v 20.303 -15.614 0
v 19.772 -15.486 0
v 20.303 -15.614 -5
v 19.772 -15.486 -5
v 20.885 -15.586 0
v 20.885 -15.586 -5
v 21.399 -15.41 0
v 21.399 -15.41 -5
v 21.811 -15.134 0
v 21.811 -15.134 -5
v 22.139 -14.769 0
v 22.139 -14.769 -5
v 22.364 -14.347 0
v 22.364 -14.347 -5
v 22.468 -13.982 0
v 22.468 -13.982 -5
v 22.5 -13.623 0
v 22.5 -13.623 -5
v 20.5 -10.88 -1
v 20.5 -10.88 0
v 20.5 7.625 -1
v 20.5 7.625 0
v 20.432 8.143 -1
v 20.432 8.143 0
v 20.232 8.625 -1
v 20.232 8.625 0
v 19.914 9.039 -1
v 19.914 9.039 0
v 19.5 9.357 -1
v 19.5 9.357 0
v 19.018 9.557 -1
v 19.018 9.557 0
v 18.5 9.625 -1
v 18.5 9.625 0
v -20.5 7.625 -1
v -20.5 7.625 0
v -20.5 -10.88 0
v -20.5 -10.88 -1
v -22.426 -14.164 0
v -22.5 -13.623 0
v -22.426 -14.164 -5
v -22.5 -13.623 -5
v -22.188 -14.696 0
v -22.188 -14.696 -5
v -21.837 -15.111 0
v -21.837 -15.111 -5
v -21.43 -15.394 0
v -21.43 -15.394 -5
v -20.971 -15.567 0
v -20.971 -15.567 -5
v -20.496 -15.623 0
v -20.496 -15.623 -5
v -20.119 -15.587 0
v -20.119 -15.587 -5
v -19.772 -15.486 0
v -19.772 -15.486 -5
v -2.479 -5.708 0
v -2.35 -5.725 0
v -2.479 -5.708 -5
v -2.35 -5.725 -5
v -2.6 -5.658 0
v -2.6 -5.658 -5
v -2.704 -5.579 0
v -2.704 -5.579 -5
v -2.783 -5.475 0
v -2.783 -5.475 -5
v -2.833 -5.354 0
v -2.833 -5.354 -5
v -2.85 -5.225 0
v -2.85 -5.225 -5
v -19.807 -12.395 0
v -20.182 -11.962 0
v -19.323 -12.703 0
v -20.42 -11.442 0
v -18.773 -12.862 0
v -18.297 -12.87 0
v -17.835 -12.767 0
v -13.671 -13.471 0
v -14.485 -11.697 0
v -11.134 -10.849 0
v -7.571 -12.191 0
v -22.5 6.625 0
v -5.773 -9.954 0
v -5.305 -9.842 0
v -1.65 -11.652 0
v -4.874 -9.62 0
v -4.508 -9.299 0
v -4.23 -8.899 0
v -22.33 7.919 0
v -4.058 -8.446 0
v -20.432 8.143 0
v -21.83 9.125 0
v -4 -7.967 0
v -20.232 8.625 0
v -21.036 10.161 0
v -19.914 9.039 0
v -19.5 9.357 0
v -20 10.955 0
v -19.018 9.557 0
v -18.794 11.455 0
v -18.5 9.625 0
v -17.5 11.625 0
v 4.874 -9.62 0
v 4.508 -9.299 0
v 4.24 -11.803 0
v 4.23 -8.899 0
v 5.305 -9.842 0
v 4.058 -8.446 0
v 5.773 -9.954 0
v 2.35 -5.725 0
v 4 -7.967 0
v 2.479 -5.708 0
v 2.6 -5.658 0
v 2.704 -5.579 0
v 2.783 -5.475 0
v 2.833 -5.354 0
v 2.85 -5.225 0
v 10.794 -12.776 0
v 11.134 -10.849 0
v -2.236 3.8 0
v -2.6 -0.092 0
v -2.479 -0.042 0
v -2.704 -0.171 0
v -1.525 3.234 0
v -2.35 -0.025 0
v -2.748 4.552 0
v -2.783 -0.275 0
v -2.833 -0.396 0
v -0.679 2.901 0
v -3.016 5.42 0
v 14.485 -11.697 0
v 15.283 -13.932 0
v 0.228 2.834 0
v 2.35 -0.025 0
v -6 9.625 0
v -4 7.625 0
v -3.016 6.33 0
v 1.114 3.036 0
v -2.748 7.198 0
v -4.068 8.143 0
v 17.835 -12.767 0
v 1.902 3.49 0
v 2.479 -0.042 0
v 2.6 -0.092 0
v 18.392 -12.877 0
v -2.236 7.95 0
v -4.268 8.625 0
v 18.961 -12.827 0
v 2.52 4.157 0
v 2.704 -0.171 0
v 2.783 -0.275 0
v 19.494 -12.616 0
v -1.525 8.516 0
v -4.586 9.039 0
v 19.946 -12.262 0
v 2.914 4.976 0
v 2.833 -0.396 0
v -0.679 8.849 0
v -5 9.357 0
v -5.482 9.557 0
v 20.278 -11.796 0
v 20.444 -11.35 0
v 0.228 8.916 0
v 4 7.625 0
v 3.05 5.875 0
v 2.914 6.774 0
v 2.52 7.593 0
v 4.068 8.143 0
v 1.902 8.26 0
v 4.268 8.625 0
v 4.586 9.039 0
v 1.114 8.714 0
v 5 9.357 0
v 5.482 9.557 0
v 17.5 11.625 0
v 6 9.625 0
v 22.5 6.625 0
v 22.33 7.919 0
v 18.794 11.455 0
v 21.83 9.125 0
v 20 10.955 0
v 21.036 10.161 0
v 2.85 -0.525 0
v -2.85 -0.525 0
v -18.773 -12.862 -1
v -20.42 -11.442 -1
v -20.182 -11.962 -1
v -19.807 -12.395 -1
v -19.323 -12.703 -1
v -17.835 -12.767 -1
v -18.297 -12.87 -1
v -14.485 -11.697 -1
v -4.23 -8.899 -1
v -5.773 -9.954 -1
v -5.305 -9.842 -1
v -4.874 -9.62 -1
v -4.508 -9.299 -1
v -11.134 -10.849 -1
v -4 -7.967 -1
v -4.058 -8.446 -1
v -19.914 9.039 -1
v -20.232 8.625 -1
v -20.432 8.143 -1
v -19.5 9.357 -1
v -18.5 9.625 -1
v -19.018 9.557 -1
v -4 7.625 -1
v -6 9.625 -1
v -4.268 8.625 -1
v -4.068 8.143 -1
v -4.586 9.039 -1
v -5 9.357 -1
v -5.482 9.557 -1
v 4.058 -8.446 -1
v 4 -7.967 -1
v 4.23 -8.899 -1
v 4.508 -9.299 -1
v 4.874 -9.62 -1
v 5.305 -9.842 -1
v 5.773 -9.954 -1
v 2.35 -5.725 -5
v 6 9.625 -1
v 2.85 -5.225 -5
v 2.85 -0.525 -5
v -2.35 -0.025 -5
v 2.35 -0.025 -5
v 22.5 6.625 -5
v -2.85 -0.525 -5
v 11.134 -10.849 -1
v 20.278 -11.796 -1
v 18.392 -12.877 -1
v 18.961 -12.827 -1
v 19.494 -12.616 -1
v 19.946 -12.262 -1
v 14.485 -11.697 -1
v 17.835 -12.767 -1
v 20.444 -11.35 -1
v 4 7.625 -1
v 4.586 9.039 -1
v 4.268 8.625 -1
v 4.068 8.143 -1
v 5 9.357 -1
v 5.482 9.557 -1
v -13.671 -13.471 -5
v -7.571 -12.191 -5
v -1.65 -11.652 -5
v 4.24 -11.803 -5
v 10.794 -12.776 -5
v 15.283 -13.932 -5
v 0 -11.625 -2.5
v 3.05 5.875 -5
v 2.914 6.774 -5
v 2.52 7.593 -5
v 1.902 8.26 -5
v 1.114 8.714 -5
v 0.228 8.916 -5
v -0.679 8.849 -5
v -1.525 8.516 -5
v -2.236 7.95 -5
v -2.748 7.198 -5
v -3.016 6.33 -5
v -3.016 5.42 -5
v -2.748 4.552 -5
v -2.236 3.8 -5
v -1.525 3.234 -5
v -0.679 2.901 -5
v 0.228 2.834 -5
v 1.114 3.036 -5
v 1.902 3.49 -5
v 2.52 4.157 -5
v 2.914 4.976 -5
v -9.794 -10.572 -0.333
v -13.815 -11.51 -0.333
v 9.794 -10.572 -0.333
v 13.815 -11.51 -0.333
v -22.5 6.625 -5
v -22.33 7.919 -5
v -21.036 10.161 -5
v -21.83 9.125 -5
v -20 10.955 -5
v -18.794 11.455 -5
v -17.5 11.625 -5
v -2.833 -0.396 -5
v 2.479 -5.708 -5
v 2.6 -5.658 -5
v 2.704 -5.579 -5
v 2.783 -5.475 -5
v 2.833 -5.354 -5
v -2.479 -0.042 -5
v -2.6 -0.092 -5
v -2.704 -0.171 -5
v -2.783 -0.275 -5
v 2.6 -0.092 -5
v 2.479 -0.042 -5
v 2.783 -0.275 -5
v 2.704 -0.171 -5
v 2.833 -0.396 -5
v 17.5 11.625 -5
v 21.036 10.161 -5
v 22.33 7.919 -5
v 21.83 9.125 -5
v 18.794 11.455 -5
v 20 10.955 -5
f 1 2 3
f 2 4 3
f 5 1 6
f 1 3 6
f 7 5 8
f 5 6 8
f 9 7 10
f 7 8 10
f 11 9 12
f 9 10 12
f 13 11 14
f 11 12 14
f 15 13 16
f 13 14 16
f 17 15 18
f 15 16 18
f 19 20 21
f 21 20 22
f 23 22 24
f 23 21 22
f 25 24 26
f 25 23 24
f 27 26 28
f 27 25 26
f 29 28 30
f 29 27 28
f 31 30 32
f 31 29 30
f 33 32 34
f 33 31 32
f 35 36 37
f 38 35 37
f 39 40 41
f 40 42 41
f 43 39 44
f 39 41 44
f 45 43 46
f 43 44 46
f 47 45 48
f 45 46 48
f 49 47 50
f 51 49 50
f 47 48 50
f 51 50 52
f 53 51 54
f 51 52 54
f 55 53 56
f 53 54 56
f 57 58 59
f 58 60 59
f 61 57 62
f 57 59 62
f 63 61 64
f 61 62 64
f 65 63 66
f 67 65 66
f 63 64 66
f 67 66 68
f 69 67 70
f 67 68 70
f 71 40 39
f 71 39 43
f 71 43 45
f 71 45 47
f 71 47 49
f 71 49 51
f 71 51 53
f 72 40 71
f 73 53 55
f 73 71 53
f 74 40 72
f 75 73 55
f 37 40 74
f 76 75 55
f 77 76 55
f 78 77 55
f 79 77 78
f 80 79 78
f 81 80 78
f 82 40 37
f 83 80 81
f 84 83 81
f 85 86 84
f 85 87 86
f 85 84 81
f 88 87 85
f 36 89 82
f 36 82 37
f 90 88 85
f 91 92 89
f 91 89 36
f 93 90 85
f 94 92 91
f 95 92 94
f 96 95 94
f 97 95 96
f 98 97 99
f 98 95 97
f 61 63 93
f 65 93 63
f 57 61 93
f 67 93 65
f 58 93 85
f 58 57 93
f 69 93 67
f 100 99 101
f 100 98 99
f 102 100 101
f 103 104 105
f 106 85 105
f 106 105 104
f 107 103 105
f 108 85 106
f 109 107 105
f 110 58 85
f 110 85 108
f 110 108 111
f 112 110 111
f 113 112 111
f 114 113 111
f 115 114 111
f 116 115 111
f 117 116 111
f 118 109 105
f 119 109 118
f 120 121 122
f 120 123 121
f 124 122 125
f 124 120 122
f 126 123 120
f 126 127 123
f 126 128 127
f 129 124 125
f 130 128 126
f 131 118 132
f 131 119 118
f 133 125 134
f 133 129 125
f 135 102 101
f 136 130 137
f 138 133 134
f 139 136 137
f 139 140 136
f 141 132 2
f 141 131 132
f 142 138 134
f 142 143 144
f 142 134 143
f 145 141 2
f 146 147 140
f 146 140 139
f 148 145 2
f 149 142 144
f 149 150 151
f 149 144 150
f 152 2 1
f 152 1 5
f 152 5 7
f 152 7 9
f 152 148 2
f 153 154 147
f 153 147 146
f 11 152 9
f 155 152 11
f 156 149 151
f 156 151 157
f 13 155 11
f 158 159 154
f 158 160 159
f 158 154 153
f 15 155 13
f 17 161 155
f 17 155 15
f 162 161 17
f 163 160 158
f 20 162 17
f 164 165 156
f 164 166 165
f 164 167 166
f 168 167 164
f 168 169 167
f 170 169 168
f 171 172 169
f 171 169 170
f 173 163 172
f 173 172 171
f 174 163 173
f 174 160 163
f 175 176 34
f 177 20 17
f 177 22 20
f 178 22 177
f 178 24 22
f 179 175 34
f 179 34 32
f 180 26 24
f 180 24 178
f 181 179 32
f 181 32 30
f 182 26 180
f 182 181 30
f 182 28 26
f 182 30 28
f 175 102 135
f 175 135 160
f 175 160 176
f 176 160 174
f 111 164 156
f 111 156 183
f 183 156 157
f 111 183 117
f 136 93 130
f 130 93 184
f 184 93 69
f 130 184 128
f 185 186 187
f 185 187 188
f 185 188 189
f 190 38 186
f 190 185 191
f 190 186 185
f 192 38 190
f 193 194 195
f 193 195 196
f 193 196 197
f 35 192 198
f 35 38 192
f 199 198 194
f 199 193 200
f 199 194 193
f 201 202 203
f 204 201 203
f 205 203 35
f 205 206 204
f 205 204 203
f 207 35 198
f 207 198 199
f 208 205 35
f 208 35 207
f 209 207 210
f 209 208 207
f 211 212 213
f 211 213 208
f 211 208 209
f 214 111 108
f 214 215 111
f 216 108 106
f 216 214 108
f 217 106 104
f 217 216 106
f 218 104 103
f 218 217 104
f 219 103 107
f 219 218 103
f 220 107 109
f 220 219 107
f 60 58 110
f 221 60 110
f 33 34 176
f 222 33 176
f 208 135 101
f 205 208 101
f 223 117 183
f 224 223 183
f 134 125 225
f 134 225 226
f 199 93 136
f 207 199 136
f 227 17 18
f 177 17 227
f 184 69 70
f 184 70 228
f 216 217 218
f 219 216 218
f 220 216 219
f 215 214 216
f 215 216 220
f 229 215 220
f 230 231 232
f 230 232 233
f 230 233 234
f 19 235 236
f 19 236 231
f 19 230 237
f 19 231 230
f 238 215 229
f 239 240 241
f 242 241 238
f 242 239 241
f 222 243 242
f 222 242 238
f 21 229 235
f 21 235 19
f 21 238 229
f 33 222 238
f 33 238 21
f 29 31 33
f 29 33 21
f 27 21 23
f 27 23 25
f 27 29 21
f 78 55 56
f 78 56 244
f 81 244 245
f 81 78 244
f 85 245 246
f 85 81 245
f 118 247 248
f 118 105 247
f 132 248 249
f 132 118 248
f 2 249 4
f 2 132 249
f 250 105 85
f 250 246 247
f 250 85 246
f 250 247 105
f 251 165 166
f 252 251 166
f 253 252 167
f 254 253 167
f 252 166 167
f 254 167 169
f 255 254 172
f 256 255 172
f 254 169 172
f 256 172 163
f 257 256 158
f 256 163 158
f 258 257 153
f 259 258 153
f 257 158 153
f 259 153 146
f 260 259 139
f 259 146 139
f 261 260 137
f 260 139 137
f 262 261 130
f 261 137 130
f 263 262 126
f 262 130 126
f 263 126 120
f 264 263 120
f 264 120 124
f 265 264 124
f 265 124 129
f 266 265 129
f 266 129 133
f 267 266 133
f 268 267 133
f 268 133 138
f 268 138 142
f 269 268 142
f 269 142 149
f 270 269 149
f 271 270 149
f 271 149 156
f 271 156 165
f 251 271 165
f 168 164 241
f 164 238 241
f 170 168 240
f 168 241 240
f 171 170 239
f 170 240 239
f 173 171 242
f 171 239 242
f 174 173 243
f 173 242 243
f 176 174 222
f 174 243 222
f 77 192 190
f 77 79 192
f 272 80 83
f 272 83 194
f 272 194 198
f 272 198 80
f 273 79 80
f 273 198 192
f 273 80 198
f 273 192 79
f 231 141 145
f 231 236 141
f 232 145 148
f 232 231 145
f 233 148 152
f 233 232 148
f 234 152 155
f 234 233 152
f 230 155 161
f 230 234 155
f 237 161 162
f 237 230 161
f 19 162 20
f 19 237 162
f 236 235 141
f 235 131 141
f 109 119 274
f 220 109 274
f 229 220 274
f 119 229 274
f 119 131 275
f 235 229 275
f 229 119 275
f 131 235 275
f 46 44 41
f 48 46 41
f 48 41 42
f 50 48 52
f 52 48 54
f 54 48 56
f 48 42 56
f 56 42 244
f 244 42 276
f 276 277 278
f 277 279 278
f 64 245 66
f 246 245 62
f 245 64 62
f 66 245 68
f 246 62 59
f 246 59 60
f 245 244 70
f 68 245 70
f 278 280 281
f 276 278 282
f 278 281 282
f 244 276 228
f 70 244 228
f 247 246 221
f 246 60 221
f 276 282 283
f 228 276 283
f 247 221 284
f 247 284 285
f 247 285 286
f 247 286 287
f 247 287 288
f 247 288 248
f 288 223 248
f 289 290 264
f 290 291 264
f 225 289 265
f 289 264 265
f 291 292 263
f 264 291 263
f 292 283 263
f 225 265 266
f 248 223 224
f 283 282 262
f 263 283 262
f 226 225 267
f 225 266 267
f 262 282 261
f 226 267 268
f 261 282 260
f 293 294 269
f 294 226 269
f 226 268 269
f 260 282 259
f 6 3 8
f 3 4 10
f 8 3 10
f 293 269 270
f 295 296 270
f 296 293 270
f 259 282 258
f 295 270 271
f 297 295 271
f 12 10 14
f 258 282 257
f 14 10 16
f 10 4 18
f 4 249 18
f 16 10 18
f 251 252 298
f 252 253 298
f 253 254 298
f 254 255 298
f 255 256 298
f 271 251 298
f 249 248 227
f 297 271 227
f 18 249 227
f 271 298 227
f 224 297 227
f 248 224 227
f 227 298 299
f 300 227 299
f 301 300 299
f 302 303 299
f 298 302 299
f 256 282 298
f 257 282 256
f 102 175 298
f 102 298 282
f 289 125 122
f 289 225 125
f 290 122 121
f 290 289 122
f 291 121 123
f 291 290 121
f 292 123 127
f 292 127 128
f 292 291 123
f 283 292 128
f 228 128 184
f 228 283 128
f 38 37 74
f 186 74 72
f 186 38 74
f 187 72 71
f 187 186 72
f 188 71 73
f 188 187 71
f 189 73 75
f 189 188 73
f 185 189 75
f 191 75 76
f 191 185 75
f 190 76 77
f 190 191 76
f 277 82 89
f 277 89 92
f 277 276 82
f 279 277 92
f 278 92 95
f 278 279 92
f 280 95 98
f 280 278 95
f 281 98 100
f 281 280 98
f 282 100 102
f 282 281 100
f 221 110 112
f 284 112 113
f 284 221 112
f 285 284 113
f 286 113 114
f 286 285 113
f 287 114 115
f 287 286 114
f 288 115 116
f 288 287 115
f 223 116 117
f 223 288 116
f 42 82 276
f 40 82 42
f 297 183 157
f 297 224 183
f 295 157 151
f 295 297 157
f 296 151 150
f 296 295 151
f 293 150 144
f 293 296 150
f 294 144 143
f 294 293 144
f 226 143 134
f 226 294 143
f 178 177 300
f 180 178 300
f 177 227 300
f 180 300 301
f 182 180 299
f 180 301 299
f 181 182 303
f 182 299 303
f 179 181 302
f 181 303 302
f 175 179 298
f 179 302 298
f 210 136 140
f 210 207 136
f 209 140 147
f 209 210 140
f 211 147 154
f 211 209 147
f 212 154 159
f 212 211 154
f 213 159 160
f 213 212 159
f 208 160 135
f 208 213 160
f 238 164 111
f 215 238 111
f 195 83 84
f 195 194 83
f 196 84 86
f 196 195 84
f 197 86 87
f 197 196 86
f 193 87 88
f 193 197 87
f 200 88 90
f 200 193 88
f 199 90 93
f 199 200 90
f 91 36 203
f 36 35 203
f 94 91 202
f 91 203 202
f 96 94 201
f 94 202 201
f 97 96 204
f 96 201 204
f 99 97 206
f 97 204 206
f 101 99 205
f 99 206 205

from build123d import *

# Parameters (mm, degrees)
BOSS_EXTRUDE1_DEPTH = 5
SKETCH2_R           = 3.05
SKETCH2_W           = 5.7
SKETCH2_H           = 5.7
CUT_EXTRUDE1_DEPTH  = 29.419018875
FILLET1_R           = 0.5
CUT_EXTRUDE2_DEPTH  = 1
FILLET2_R           = 5
FILLET3_R           = 2
FILLET4_R           = 2


with BuildPart() as part:
    # Sketch1 → Boss-Extrude1 (new body)
    with BuildSketch(Plane.XY):
        with BuildLine():
            Line((-22.5, -11.625), (-22.5, -16.625))
            add(Edge.make_bspline(
                [(-22.5, -16.625), (0, -6.625), (22.5, -16.625)],
                knots=[0, 0, 0, 1, 1, 1], degree=2))
            Line((22.5, -16.625), (22.5, -11.625))
            Line((22.5, -11.625), (22.5, 11.625))
            Line((22.5, 11.625), (-22.5, 11.625))
            Line((-22.5, 11.625), (-22.5, -11.625))
        make_face()
    extrude(amount=-BOSS_EXTRUDE1_DEPTH)

    # Sketch2 → Cut-Extrude1 (cut, through all)
    with BuildSketch(Plane.XY):
        with Locations((0, 5.875)):
            Circle(SKETCH2_R)
        with Locations((0, -2.875)):
            Rectangle(SKETCH2_W, SKETCH2_H)
    extrude(amount=-CUT_EXTRUDE1_DEPTH, mode=Mode.SUBTRACT)

    # Fillet1
    fillet1_edges = [part.edges().sort_by_distance(p)[0] for p in [
        (2.85, -0.025, -2.5),
        (2.85, -5.725, -2.5),
        (-2.85, -5.725, -2.5),
        (-2.85, -0.025, -2.5),
    ]]
    fillet(fillet1_edges, radius=FILLET1_R)

    # Sketch3 → Cut-Extrude2 (cut)
    with BuildSketch(Plane.XY):
        with BuildLine():
            Line((-20.5, 9.625), (-20.5, -13.775617284))
            add(Edge.make_bspline(
                [(-4, -9.783024691), (-9.5, -10.217592593), (-15, -11.54845679), (-20.5, -13.775617284)],
                knots=[0.588888889, 0.588888889, 0.588888889, 0.588888889, 0.955555556, 0.955555556, 0.955555556, 0.955555556], degree=3))
            Line((-4, -9.783024691), (-4, 9.625))
            Line((-4, 9.625), (-20.5, 9.625))
        make_face()
        with BuildLine():
            Line((4, 9.625), (4, -9.783024691))
            add(Edge.make_bspline(
                [(4, -9.783024691), (9.5, -10.217592593), (15, -11.54845679), (20.5, -13.775617284)],
                knots=[0.588888889, 0.588888889, 0.588888889, 0.588888889, 0.955555556, 0.955555556, 0.955555556, 0.955555556], degree=3))
            Line((20.5, -13.775617284), (20.5, 9.625))
            Line((20.5, 9.625), (4, 9.625))
        make_face()
    extrude(amount=-CUT_EXTRUDE2_DEPTH, mode=Mode.SUBTRACT)

    # Fillet2
    fillet2_edges = [part.edges().sort_by_distance(p)[0] for p in [
        (-22.5, 11.625, -2.5),
        (22.5, 11.625, -2.5),
    ]]
    fillet(fillet2_edges, radius=FILLET2_R)

    # Fillet3
    fillet3_edges = [part.edges().sort_by_distance(p)[0] for p in [
        (22.5, -16.625, -2.5),
        (-22.5, -16.625, -2.5),
    ]]
    fillet(fillet3_edges, radius=FILLET3_R)

    # Fillet4
    fillet4_edges = [part.edges().sort_by_distance(p)[0] for p in [
        (20.5, -13.775617284, -0.5),
        (4, -9.783024691, -0.5),
        (20.5, 9.625, -0.5),
        (4, 9.625, -0.5),
        (-4, 9.625, -0.5),
        (-20.5, 9.625, -0.5),
        (-4, -9.783024691, -0.5),
        (-20.5, -13.775617284, -0.5),
    ]]
    fillet(fillet4_edges, radius=FILLET4_R)


solid = part.part
